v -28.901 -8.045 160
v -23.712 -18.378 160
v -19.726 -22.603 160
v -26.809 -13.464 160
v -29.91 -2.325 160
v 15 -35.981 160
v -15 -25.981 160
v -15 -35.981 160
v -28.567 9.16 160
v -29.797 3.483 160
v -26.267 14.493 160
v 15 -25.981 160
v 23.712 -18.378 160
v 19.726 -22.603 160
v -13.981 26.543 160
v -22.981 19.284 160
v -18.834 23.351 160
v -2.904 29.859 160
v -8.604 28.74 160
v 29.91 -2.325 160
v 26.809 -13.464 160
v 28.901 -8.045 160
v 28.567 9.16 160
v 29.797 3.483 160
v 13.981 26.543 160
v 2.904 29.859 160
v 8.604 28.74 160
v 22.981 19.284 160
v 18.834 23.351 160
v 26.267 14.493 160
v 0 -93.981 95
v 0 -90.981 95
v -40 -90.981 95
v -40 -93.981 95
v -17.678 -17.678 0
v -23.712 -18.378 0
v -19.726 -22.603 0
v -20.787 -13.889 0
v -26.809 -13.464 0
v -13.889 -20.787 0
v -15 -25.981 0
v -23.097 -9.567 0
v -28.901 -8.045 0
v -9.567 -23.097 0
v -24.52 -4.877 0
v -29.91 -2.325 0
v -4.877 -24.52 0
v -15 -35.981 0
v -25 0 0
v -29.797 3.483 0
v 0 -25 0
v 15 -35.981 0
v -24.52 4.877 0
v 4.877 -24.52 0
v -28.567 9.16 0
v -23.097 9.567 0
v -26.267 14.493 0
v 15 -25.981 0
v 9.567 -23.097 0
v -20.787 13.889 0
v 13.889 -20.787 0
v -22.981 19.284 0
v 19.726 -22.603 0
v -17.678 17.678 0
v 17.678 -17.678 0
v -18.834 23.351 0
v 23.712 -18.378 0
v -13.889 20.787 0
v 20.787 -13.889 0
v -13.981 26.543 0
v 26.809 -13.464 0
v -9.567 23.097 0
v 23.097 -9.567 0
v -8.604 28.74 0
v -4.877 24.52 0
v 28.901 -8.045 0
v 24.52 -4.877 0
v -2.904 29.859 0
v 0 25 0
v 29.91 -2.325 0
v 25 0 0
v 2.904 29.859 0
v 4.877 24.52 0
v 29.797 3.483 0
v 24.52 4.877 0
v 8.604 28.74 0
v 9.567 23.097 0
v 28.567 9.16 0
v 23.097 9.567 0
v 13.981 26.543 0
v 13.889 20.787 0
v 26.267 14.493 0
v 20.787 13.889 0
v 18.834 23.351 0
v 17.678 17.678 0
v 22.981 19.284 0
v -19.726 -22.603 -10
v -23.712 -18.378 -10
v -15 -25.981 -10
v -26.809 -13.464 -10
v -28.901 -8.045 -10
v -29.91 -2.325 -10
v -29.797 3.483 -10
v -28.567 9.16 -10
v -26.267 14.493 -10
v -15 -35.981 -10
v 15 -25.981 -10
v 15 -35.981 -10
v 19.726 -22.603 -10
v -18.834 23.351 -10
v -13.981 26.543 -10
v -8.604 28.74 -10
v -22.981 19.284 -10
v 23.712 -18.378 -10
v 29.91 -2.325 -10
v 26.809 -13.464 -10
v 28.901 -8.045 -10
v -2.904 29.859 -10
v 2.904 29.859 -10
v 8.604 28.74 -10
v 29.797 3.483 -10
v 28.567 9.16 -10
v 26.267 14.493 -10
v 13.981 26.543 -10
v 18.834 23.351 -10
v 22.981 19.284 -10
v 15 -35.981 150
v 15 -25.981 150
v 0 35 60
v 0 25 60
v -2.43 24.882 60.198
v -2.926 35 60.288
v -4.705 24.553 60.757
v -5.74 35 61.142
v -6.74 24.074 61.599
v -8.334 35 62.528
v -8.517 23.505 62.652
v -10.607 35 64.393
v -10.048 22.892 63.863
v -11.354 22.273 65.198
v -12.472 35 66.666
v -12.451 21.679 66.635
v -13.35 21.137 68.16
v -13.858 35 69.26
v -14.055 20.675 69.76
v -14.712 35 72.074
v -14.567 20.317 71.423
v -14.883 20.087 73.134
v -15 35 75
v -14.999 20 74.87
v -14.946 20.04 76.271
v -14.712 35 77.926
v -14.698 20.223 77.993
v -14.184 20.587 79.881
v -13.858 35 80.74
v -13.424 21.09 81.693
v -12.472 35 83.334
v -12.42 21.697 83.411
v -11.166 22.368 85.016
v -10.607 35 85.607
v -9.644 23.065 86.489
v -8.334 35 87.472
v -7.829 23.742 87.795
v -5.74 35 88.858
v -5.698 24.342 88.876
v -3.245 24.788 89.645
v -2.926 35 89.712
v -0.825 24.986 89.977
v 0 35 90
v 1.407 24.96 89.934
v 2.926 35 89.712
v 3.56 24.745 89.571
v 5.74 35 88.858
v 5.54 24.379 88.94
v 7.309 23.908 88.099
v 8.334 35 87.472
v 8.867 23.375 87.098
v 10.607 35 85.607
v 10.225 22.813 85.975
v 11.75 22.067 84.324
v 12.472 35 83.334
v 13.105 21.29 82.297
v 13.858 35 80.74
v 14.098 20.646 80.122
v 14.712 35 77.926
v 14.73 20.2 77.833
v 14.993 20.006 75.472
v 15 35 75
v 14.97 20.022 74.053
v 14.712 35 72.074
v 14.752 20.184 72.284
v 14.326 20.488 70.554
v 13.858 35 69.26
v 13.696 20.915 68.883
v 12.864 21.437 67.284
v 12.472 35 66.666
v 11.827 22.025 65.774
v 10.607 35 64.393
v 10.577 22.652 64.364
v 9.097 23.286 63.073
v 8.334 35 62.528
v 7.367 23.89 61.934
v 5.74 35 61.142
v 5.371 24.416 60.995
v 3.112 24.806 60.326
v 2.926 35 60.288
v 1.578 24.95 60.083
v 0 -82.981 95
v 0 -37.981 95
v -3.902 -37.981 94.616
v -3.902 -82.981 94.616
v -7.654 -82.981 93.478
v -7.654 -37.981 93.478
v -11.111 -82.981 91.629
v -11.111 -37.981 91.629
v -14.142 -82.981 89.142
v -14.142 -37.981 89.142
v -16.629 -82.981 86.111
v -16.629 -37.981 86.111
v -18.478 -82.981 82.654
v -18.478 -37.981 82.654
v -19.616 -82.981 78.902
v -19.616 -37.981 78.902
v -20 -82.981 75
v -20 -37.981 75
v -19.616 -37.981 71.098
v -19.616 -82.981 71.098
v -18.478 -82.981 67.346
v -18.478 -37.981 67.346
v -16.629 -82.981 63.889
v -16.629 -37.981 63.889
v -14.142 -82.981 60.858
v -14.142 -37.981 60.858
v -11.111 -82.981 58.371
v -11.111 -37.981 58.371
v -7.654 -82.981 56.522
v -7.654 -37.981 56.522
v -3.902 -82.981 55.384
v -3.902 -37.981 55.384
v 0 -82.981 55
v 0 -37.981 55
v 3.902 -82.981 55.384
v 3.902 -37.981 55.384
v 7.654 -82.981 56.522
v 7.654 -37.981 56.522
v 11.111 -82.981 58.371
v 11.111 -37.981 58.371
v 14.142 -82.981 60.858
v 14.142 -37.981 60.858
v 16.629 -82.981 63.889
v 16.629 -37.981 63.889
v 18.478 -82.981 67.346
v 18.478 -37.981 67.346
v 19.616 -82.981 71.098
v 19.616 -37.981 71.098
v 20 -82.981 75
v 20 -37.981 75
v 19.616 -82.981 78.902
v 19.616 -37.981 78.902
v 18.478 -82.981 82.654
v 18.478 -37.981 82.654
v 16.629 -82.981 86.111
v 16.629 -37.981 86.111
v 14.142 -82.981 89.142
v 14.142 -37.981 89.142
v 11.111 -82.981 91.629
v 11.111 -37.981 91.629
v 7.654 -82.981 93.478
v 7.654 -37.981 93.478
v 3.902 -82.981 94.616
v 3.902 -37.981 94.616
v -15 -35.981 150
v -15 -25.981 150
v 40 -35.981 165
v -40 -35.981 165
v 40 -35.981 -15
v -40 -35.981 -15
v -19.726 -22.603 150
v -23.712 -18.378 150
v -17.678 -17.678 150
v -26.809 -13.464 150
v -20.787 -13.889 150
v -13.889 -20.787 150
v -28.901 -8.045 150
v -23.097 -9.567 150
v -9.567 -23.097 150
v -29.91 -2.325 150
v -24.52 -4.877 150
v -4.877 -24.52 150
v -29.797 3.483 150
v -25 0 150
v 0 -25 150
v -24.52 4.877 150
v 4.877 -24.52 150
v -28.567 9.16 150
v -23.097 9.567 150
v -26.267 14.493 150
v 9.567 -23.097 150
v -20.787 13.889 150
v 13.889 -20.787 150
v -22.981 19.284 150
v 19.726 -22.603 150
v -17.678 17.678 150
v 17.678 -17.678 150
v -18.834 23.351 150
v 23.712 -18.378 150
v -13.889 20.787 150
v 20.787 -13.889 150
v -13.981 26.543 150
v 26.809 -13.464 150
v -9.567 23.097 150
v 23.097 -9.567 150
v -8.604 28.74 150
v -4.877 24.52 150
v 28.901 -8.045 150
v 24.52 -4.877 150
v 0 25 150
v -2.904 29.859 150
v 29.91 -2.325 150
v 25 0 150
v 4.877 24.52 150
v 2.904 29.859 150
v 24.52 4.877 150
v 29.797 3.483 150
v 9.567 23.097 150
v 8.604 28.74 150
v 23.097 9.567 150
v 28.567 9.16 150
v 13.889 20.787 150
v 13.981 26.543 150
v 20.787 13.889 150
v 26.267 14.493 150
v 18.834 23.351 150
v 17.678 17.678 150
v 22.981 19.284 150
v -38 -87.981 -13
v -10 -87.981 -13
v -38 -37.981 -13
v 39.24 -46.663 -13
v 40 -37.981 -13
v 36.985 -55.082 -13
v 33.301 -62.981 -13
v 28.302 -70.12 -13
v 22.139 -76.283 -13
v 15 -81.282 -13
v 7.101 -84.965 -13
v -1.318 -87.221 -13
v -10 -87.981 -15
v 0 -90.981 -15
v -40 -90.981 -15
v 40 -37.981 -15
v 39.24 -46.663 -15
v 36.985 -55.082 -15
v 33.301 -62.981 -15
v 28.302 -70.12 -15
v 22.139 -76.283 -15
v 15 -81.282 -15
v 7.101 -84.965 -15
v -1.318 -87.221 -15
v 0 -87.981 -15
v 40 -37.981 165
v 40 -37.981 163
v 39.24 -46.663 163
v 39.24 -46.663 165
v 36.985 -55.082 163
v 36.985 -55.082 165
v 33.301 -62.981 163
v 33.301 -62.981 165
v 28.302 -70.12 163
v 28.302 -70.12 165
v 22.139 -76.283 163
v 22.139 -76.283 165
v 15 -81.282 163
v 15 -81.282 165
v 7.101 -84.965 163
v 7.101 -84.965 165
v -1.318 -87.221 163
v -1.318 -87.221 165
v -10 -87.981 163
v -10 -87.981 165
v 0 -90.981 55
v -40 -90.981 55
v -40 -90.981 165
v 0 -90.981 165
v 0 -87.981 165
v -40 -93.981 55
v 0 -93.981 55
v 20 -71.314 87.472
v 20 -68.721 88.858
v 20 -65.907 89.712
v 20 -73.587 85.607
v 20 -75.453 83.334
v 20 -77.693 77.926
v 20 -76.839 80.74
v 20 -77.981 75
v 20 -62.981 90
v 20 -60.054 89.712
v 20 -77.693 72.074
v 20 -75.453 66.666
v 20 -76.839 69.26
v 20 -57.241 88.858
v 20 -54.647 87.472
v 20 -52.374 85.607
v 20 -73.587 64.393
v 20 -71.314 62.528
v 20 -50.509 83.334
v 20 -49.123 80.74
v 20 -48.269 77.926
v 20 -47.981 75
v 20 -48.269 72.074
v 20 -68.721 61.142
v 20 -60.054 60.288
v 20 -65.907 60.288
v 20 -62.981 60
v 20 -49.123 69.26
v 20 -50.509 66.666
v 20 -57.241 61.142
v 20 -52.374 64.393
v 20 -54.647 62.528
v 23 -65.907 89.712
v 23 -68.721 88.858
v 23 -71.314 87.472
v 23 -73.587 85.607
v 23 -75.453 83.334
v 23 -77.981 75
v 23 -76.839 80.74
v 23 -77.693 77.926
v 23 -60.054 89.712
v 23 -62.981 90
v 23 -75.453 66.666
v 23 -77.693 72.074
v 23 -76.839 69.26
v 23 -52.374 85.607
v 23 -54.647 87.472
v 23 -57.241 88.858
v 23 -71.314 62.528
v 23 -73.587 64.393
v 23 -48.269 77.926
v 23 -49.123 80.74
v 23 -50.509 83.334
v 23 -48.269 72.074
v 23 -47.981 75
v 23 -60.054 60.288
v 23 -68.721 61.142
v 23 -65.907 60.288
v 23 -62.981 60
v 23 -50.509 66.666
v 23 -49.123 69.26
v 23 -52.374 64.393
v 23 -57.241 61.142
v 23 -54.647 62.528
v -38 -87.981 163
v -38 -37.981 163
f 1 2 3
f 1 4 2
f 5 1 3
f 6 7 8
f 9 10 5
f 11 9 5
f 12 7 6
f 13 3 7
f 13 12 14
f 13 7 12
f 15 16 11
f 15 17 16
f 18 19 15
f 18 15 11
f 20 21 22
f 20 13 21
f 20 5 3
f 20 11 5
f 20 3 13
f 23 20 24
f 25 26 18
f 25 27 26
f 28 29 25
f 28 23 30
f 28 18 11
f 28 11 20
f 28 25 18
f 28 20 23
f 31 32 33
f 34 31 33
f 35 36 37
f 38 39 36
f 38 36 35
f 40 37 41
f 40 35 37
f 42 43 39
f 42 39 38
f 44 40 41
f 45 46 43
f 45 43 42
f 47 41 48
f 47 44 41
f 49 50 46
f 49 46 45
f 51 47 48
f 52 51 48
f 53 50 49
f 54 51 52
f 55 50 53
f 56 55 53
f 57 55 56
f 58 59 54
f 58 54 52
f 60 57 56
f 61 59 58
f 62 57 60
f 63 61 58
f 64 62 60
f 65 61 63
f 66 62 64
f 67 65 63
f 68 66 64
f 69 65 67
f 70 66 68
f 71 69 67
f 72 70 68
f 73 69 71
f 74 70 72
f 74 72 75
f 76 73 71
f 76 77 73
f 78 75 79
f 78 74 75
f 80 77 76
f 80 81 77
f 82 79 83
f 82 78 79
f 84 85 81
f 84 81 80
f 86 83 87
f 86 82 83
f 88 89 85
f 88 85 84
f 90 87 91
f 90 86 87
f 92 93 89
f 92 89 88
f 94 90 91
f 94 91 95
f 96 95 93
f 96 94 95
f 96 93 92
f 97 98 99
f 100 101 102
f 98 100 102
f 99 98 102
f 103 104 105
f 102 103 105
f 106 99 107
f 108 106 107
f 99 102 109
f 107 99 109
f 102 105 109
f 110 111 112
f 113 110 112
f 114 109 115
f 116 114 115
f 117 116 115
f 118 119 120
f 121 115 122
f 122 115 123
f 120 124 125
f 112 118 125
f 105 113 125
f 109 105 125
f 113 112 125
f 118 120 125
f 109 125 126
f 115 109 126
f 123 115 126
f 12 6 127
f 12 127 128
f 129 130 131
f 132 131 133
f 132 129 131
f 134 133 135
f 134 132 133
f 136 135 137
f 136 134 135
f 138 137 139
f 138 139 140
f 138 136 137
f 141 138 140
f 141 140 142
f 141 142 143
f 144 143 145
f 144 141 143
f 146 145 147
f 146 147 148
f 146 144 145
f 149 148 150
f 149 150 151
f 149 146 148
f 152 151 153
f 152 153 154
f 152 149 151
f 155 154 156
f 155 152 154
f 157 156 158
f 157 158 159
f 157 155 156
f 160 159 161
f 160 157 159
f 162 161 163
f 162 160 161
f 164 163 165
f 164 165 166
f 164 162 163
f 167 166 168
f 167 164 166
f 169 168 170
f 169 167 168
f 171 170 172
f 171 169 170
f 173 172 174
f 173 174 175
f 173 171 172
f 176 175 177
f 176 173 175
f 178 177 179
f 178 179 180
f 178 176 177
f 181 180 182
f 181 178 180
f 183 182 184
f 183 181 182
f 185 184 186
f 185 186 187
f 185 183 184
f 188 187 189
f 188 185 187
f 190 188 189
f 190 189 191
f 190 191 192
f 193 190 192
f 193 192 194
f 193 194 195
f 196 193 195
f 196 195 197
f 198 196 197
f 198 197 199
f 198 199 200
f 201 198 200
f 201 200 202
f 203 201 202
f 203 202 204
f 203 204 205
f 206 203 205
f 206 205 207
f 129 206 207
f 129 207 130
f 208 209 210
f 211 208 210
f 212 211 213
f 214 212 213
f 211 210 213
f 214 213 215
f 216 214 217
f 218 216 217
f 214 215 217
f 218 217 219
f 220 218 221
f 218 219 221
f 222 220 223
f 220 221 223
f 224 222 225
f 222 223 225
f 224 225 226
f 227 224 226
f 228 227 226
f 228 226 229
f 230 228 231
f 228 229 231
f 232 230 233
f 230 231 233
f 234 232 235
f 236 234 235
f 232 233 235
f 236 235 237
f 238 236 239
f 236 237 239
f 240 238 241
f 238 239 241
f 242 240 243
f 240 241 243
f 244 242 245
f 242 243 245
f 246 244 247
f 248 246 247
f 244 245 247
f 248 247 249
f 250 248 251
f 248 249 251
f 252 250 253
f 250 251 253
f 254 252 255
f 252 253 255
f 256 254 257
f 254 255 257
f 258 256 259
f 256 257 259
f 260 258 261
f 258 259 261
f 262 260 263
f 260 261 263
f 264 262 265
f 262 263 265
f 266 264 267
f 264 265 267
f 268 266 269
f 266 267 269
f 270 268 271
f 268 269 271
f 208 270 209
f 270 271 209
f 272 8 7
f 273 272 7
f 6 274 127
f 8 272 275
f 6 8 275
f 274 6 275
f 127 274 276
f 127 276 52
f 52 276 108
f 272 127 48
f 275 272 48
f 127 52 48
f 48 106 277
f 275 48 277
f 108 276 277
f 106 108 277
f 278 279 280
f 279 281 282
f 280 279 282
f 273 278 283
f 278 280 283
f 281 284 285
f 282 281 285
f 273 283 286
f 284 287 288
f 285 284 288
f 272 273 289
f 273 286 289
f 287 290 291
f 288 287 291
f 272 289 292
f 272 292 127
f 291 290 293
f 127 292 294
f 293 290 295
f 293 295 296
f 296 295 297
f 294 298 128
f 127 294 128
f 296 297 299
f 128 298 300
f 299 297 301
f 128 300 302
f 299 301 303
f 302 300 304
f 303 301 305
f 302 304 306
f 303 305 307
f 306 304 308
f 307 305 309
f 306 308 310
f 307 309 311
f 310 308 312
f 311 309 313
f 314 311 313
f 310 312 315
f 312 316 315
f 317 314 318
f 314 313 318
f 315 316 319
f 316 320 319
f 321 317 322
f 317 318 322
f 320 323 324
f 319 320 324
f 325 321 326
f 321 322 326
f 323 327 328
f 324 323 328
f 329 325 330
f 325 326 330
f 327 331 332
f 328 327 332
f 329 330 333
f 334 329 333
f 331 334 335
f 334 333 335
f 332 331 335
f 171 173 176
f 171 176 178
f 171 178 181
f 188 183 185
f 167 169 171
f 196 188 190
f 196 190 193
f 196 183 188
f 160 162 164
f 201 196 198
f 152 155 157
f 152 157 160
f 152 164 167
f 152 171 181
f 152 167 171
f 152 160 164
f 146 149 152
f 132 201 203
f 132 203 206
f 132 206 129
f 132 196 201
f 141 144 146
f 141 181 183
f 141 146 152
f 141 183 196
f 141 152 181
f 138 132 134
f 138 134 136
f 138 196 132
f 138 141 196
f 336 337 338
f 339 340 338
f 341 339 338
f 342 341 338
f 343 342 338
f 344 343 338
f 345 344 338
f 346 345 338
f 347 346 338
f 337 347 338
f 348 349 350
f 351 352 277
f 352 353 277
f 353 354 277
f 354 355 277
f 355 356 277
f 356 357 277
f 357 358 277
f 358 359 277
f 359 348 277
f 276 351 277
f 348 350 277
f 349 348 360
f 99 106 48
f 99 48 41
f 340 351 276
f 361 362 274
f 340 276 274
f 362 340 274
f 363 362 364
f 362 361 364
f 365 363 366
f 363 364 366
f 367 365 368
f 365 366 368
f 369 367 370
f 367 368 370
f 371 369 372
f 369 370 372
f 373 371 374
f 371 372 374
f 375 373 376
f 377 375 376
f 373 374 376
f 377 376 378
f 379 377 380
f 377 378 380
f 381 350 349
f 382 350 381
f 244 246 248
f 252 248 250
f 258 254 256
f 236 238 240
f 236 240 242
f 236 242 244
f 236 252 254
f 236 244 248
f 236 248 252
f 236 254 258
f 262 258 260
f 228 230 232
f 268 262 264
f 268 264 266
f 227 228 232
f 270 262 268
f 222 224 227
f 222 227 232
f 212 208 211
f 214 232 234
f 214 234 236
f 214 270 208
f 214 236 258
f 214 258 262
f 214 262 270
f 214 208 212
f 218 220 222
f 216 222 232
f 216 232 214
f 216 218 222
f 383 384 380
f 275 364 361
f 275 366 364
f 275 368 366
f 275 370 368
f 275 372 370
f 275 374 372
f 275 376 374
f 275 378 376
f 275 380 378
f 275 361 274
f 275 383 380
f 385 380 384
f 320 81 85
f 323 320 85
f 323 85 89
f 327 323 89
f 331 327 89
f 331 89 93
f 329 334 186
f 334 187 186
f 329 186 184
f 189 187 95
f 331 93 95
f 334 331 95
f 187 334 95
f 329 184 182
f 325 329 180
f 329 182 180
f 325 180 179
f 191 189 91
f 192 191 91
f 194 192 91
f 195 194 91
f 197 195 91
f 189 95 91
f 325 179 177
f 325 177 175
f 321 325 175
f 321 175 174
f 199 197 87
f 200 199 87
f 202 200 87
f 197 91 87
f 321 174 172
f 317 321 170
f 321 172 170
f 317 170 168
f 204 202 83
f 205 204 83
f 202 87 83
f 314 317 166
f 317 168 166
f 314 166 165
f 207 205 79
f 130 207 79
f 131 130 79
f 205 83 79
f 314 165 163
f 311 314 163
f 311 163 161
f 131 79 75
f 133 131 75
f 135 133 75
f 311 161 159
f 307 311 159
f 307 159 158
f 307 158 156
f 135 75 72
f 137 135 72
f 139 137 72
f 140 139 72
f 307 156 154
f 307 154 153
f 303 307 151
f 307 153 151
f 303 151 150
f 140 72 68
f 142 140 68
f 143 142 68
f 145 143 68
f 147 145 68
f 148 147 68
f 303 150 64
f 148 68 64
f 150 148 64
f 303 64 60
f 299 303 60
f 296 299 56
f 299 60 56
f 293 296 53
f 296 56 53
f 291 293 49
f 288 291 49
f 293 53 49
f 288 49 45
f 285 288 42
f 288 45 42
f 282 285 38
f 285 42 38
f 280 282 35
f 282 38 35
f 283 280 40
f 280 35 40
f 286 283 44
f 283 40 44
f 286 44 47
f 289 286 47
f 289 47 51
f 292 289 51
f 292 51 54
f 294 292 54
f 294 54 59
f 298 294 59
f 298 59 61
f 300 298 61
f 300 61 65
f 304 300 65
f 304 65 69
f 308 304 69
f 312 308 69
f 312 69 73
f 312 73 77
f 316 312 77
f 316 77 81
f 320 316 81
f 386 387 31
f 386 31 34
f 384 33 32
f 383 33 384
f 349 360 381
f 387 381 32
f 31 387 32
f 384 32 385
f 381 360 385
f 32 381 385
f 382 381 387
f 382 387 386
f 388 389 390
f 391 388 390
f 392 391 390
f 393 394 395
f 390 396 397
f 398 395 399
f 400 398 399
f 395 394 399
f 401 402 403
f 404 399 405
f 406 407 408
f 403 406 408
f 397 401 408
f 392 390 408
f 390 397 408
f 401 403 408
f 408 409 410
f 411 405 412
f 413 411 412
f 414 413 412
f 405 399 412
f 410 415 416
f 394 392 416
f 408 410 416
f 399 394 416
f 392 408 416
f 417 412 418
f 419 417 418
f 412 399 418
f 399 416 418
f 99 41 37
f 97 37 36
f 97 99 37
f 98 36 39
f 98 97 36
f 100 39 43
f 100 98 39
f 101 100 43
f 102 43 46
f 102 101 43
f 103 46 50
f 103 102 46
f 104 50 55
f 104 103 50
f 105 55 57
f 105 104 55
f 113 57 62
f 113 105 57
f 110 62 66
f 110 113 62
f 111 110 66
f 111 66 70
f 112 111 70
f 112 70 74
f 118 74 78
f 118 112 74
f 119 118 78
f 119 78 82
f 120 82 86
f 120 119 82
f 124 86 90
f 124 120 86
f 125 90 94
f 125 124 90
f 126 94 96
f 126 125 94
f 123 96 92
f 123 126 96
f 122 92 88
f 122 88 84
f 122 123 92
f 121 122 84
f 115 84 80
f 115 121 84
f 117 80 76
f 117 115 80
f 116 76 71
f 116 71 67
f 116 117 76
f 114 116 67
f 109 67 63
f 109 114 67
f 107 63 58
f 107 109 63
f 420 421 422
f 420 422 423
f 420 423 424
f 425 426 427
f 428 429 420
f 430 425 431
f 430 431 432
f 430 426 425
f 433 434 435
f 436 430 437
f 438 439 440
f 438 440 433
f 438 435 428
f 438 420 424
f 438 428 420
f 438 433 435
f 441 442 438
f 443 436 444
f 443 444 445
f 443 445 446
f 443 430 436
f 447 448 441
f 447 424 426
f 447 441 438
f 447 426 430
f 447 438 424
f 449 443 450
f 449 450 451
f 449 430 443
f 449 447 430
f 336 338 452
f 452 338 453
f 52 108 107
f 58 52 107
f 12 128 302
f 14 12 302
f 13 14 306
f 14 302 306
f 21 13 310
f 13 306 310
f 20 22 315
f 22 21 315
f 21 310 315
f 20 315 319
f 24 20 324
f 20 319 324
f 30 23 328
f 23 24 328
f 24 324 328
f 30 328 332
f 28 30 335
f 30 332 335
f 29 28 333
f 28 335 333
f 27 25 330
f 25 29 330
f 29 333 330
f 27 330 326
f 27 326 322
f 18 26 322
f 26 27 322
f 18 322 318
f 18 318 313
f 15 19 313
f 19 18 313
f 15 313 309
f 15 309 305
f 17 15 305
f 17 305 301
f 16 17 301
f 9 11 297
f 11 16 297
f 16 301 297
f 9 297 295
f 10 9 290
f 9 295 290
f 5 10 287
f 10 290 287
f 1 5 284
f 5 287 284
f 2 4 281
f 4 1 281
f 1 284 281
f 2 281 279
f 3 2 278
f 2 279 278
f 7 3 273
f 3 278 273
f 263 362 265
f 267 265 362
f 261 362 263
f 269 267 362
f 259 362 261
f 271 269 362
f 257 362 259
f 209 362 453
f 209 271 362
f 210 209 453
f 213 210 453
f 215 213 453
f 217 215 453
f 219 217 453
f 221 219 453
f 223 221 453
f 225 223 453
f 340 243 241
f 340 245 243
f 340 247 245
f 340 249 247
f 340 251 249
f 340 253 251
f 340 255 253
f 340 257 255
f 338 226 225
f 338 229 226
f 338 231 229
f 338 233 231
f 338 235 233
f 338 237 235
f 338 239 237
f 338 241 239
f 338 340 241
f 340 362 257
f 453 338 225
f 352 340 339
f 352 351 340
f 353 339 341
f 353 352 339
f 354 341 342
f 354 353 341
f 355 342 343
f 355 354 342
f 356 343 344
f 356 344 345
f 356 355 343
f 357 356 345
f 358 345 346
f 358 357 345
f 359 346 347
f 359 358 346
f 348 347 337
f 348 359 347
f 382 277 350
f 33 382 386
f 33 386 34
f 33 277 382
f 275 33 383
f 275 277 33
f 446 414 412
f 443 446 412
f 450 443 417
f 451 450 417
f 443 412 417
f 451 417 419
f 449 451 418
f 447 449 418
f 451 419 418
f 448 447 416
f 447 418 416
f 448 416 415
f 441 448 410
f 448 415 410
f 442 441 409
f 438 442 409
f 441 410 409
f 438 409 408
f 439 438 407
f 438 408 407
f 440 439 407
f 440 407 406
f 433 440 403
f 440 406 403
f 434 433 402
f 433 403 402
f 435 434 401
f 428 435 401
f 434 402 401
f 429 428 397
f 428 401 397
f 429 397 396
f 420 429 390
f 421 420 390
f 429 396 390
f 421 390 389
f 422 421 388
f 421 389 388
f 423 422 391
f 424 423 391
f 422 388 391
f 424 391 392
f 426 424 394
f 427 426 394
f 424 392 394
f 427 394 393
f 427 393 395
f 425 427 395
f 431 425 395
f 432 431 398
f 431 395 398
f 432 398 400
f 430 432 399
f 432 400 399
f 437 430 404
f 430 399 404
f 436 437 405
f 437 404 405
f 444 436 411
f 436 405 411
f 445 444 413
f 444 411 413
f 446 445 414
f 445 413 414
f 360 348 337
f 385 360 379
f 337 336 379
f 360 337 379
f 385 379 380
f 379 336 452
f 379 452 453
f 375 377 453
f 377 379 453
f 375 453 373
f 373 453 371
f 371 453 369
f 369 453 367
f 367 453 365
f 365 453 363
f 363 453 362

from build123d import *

# Parameters (mm, degrees)
SKETCH1_R            = 25
BOSS_EXTRUDE1_DEPTH  = 150
SKETCH2_R            = 30
BOSS_EXTRUDE2_DEPTH  = 10
BOSS_EXTRUDE3_START  = 10
SKETCH3_R            = 30
BOSS_EXTRUDE3_DEPTH  = 10
SKETCH4_R            = 15
BOSS_EXTRUDE4_DEPTH  = 10
SKETCH5_W            = 30
SKETCH5_H            = 10
BOSS_EXTRUDE5_DEPTH  = 10
SKETCH6_W            = 80
SKETCH6_H            = 180
BOSS_EXTRUDE6_DEPTH  = 2
SKETCH7_W            = 78
SKETCH7_H            = 2
BOSS_EXTRUDE7_DEPTH  = 50
FILLET1_R            = 50
SKETCH8_R            = 20
BOSS_EXTRUDE8_DEPTH  = 45
SKETCH10_R           = 15
BOSS_EXTRUDE9_DEPTH  = 3
SKETCH11_W           = 180
SKETCH11_H           = 3
BOSS_EXTRUDE10_DEPTH = 40
SKETCH12_W           = 40
SKETCH12_H           = 40
BOSS_EXTRUDE11_DEPTH = 3


with BuildPart() as part:
    # Sketch1 → Boss-Extrude1 (new body)
    with BuildSketch(Plane.XY):
        Circle(SKETCH1_R)
    extrude(amount=BOSS_EXTRUDE1_DEPTH)

    # Sketch2 → Boss-Extrude2 (add)
    with BuildSketch(Plane.XY.offset(150)):
        Circle(SKETCH2_R)
    extrude(amount=BOSS_EXTRUDE2_DEPTH)

    # Sketch3 → Boss-Extrude3 (add)
    with BuildSketch(Plane(origin=(0, 0, 0), x_dir=(-1, 0, 0), z_dir=(0, 0, -1)).offset(BOSS_EXTRUDE3_START)):
        with Locations(Location((0, 0, 0), (0, 0, 180))):
            Circle(SKETCH3_R)
    extrude(amount=-BOSS_EXTRUDE3_DEPTH)

    # Sketch4 → Boss-Extrude4 (add, symmetric)
    with BuildSketch(Plane(origin=(0, 25, 0), x_dir=(1, 0, 0), z_dir=(0, 1, 0))):
        with Locations(Location((0, -75, 0), (0, 0, 90))):
            Circle(SKETCH4_R)
    extrude(amount=BOSS_EXTRUDE4_DEPTH, both=True)

    # Sketch5 → Boss-Extrude5 (add)
    with BuildSketch(Plane.XY.offset(160)):
        with Locations((0, -30.980762114)):
            Rectangle(SKETCH5_W, SKETCH5_H)
    boss_extrude5 = extrude(amount=-BOSS_EXTRUDE5_DEPTH)

    # Mirror1: Boss-Extrude5 across plane
    add(boss_extrude5.mirror(Plane.XY.offset(75)))

    # Sketch6 → Boss-Extrude6 (add)
    with BuildSketch(Plane(origin=(0, -35.980762114, 0), x_dir=(-1, 0, 0), z_dir=(0, -1, 0))):
        with Locations((0, -75)):
            Rectangle(SKETCH6_W, SKETCH6_H)
    extrude(amount=BOSS_EXTRUDE6_DEPTH)

    # Sketch7 → Boss-Extrude7 (add)
    with BuildSketch(Plane(origin=(0, -37.980762114, 0), x_dir=(-1, 0, 0), z_dir=(0, -1, 0))):
        Polygon((-40, -163), (-40, -165), (40, -165), (40, -163), (38, -163), align=None)
        Polygon((38, -163), (40, -163), (40, 15), (38, 15), (38, 13), align=None)
        with Locations((-1, 14)):
            Rectangle(SKETCH7_W, SKETCH7_H)
    extrude(amount=BOSS_EXTRUDE7_DEPTH)

    # Fillet1
    fillet1_edges = [part.edges().sort_by_distance(p)[0] for p in [
        (40, -87.980762114, -14),
        (40, -87.980762114, 164),
    ]]
    fillet(fillet1_edges, radius=FILLET1_R)

    # Sketch8 → Boss-Extrude8 (add)
    with BuildSketch(Plane(origin=(0, -37.980762114, 0), x_dir=(-1, 0, 0), z_dir=(0, -1, 0))):
        with Locations(Location((0, -75, 0), (0, 0, 270))):
            Circle(SKETCH8_R)
    extrude(amount=BOSS_EXTRUDE8_DEPTH)

    # Sketch11 → Boss-Extrude10 (add)
    with BuildSketch(Plane.ZY.offset(40)):
        with Locations((75, -89.480762114)):
            Rectangle(SKETCH11_W, SKETCH11_H)
    extrude(amount=-BOSS_EXTRUDE10_DEPTH)

    # Sketch12 → Boss-Extrude11 (add)
    with BuildSketch(Plane(origin=(0, -90.980762114, 0), x_dir=(-1, 0, 0), z_dir=(0, -1, 0))):
        with Locations((20, -75)):
            Rectangle(SKETCH12_W, SKETCH12_H)
    extrude(amount=BOSS_EXTRUDE11_DEPTH)


with BuildPart() as body_2:
    # Sketch10 → Boss-Extrude9 (new body)
    with BuildSketch(Plane(origin=(20, 0, 0), x_dir=(0, 0, -1), z_dir=(1, 0, 0))):
        with Locations((-75, -62.980762114)):
            Circle(SKETCH10_R)
    extrude(amount=BOSS_EXTRUDE9_DEPTH)


solid = Compound([part.part, body_2.part])
